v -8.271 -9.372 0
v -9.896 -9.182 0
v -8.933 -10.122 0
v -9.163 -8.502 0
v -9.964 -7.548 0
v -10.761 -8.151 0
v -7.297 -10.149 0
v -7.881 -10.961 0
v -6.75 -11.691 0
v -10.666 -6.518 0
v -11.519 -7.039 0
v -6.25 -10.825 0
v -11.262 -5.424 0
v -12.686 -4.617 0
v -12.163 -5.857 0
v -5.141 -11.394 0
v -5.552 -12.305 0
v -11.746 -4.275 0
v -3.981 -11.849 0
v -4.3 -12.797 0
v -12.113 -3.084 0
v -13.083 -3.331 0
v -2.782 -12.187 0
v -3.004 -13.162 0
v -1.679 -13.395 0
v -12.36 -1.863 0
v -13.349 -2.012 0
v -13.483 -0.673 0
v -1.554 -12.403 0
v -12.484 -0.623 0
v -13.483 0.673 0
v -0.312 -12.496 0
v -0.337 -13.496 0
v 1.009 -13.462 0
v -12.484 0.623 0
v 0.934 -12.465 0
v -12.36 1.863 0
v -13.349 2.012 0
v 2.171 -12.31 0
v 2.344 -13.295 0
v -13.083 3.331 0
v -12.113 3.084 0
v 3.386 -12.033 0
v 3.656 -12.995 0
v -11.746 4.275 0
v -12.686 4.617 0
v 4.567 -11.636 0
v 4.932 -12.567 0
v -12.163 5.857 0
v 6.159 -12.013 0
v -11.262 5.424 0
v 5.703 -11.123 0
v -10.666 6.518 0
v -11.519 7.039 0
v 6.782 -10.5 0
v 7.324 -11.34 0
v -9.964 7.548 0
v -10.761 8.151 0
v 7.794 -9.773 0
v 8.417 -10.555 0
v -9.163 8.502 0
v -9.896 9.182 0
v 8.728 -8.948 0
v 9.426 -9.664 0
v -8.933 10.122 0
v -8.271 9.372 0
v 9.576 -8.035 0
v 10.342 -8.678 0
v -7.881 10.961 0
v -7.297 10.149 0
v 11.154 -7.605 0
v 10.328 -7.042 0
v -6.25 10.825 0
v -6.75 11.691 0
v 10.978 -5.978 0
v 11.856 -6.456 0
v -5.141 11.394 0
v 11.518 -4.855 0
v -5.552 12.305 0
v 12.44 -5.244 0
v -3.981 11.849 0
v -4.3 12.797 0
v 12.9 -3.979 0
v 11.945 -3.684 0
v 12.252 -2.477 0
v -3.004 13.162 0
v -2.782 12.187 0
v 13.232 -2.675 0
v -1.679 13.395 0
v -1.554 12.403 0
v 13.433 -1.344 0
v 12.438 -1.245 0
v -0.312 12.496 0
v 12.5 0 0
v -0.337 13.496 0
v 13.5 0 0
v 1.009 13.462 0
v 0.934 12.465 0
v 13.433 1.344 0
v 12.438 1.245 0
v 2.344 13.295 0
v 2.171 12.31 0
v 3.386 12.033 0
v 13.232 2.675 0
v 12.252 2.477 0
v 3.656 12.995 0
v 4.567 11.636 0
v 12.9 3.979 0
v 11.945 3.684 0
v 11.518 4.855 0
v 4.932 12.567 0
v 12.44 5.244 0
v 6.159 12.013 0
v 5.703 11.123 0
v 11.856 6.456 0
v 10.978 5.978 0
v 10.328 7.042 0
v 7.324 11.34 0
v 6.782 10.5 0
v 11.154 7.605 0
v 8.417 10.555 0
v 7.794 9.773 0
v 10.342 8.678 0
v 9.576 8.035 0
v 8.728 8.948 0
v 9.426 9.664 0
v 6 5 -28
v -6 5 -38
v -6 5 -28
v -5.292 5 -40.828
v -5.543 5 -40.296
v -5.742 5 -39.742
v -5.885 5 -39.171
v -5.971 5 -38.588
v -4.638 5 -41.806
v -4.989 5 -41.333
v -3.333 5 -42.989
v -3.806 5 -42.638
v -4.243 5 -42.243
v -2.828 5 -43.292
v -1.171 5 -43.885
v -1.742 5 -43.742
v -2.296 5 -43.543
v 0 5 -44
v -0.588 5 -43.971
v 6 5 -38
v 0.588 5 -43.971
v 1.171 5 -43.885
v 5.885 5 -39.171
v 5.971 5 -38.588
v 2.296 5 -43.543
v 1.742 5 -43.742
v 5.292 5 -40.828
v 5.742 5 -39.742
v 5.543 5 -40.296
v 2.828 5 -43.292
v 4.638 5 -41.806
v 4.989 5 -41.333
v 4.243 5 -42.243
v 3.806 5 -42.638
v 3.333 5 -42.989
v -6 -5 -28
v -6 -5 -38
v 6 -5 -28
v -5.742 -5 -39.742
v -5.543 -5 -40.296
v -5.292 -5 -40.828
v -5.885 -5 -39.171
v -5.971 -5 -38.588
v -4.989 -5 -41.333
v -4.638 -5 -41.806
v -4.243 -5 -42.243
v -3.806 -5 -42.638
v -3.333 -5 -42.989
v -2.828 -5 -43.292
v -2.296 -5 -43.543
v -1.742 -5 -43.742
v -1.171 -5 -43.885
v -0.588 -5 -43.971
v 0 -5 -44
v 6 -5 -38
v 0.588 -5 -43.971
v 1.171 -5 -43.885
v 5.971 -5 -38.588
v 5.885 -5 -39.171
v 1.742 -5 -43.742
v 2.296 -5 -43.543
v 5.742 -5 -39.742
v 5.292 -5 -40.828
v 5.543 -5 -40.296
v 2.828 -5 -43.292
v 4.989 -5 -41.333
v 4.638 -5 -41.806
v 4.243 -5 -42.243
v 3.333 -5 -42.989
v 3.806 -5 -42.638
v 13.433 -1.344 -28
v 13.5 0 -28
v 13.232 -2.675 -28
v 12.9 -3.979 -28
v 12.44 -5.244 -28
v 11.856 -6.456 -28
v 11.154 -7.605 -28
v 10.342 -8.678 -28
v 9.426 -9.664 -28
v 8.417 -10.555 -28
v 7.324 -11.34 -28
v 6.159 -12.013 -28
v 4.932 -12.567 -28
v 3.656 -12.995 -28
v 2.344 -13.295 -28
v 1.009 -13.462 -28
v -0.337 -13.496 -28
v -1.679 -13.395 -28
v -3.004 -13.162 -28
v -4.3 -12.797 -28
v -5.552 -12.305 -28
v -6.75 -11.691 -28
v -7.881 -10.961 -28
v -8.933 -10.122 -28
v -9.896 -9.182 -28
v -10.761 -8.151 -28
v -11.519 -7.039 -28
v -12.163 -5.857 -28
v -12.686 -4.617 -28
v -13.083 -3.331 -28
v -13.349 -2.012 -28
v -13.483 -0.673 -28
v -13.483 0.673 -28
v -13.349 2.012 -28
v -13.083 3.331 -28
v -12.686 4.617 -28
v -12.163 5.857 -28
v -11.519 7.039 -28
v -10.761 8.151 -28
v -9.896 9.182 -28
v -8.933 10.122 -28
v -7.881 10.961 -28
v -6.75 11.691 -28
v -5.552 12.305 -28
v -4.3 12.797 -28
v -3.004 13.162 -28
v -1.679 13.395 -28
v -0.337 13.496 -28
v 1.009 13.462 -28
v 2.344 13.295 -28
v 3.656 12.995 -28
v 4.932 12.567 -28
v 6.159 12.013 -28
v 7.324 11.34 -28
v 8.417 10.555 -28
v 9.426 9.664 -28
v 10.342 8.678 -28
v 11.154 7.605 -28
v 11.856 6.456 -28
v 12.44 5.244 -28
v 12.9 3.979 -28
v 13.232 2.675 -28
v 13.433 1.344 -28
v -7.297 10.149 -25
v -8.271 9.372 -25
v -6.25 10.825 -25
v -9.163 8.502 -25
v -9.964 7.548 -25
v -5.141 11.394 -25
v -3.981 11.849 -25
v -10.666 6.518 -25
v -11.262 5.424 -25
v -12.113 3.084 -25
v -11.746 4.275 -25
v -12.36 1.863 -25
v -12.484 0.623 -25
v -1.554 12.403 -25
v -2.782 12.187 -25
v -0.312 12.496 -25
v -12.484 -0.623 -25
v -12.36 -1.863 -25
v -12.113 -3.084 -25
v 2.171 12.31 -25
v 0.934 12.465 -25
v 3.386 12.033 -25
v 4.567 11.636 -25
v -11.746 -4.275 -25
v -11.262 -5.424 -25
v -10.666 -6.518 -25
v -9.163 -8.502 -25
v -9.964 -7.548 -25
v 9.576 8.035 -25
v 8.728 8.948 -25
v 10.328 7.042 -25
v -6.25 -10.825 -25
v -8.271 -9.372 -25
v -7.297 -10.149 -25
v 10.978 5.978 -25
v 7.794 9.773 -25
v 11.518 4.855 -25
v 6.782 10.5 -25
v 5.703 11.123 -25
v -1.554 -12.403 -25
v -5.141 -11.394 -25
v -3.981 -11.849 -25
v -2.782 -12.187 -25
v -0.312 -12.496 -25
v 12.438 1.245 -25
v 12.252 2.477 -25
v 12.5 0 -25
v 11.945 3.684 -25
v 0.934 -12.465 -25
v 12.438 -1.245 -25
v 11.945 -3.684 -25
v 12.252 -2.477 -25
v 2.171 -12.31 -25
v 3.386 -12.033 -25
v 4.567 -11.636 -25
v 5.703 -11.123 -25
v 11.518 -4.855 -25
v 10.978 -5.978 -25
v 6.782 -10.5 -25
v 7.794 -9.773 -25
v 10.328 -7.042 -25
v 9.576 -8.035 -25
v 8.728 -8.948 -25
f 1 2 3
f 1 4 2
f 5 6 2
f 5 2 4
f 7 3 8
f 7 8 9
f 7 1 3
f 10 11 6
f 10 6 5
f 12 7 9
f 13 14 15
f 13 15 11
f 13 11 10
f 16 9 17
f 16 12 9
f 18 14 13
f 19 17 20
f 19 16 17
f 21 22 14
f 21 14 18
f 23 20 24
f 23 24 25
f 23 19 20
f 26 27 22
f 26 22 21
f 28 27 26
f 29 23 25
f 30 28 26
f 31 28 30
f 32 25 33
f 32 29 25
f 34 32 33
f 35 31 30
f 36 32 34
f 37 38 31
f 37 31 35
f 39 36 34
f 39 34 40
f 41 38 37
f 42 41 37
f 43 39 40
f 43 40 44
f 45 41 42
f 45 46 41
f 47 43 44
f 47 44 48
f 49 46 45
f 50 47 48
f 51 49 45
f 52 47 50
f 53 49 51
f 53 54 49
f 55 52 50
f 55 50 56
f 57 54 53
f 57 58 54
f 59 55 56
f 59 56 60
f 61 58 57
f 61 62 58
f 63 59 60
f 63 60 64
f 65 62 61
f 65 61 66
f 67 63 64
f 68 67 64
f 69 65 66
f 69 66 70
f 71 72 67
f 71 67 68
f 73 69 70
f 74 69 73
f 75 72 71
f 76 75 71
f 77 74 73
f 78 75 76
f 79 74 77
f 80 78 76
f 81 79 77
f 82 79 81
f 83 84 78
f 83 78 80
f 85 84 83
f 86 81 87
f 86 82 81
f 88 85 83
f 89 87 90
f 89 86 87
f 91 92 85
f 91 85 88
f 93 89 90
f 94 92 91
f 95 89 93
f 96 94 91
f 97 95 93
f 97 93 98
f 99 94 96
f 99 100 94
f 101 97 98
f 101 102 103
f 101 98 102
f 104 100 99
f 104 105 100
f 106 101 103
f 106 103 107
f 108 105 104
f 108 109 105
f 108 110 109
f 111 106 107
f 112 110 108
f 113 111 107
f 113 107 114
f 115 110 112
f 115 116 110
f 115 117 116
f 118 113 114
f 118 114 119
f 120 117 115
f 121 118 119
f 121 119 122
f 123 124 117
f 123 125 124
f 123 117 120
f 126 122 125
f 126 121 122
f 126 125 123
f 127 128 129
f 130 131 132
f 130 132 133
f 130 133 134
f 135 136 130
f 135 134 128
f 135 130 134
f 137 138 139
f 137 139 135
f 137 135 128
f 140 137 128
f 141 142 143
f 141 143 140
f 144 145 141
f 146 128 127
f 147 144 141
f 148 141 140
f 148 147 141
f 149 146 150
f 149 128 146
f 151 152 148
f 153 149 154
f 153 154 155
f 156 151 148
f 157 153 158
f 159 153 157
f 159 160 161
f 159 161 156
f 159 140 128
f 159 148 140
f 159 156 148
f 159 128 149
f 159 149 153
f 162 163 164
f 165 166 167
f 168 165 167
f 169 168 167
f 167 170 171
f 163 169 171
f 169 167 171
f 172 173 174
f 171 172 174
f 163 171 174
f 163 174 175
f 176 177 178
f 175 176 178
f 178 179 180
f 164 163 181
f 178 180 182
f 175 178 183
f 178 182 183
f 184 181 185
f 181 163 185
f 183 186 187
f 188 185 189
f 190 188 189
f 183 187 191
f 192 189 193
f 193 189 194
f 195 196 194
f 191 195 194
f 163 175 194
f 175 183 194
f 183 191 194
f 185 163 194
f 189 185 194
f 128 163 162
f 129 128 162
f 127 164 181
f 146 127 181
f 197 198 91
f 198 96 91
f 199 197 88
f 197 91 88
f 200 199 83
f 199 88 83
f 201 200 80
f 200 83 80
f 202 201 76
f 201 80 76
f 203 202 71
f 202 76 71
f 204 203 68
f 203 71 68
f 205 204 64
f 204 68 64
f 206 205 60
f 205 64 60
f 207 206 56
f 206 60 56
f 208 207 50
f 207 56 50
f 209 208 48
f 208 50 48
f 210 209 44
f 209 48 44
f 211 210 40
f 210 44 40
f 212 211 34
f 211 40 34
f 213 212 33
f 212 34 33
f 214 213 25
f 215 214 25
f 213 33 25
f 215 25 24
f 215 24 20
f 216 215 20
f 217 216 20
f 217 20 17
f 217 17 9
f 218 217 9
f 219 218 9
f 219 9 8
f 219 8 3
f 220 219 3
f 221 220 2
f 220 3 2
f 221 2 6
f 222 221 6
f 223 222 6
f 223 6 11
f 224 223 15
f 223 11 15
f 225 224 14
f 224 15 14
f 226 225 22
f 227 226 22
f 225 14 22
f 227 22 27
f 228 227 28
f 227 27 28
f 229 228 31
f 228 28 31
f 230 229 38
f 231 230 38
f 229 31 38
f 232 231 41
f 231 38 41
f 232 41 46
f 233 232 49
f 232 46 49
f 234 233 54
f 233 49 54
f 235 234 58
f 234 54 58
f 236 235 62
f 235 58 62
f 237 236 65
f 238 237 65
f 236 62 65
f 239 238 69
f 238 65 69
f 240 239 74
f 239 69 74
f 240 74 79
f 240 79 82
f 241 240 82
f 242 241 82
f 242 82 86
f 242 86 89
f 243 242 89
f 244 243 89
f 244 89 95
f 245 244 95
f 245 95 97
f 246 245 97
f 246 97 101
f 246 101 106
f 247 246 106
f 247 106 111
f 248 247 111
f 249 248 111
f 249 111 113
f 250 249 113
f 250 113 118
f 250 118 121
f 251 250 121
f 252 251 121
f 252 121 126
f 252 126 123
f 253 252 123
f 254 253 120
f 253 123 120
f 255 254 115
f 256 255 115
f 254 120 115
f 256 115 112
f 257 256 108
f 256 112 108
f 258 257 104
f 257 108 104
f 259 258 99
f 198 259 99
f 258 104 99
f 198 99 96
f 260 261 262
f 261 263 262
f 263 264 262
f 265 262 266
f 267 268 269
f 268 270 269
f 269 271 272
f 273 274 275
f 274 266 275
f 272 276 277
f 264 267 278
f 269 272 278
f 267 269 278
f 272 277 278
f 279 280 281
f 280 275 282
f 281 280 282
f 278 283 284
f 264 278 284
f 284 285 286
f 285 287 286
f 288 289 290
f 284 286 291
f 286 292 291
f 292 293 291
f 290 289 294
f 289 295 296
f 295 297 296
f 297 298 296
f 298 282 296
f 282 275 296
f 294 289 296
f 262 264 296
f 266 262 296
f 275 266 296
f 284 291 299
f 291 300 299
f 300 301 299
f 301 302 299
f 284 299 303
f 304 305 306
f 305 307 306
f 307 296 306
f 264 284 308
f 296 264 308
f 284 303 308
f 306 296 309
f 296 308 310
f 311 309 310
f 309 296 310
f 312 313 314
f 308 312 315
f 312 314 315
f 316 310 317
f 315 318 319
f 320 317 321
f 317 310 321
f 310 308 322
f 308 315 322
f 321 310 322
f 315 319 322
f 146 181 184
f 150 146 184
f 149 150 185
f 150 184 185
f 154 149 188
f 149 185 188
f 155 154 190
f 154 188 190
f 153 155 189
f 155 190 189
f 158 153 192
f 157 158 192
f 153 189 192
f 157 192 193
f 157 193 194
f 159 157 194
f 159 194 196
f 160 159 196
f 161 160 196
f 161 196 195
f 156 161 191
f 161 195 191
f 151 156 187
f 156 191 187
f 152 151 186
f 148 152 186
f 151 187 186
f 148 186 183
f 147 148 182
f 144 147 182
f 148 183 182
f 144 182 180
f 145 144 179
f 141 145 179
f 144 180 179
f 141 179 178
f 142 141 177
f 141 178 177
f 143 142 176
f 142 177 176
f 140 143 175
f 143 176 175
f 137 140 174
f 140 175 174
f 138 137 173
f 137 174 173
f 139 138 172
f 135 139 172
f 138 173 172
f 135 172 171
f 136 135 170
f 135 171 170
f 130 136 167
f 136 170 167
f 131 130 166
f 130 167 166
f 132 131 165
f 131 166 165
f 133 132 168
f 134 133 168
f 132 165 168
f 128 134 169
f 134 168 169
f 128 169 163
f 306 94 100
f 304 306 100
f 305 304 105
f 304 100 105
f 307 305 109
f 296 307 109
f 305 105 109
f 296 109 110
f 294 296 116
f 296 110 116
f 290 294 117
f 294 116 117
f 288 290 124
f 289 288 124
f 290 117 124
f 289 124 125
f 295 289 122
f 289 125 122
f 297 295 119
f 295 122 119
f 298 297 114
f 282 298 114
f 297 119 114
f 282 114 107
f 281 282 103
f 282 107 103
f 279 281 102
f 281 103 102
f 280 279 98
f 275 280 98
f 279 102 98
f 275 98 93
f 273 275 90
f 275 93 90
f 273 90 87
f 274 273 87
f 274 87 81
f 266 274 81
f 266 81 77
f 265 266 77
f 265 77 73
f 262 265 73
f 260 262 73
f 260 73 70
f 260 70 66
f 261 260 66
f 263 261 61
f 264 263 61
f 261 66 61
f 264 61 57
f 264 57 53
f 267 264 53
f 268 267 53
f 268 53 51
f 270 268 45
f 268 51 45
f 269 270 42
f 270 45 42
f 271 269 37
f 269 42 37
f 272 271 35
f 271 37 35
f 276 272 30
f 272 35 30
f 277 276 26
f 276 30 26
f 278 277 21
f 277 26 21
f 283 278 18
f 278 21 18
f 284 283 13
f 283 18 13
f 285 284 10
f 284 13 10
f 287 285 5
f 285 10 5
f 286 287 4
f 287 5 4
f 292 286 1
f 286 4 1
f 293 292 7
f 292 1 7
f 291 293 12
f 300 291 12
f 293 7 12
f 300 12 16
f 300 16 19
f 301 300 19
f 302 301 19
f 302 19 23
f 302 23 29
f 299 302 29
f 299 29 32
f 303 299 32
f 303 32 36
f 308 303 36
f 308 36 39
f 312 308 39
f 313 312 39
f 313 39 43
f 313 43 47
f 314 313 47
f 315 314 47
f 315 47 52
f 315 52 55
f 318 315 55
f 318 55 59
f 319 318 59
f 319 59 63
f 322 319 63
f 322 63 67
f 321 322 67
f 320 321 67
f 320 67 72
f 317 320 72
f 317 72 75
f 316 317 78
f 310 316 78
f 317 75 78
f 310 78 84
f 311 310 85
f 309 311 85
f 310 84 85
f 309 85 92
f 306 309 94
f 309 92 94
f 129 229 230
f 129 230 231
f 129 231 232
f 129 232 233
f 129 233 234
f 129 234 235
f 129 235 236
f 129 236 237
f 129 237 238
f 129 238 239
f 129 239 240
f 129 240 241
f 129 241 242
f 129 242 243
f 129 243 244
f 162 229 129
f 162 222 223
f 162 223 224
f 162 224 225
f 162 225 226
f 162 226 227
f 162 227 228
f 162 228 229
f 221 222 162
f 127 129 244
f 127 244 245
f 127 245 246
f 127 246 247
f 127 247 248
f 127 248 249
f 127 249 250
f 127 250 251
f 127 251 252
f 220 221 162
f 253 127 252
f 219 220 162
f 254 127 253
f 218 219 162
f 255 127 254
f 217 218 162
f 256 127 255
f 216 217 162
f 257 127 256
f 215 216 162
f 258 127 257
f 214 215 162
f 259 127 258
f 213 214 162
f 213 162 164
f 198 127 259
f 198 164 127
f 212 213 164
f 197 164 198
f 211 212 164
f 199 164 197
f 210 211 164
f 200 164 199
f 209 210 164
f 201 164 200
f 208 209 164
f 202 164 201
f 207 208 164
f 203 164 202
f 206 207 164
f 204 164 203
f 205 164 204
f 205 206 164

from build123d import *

# Parameters (mm, degrees)
SKETCH_1_R           = 13.5
SKETCH_1_R_2         = 12.5
EXTRUDE_1_DEPTH      = 25
SKETCH_2_R           = 13.5
EXTRUDE_2_DEPTH      = 3
EXTRUDE_3_DEPTH      = 5
EXTRUDE_3_DEPTH_BACK = 5


with BuildPart() as part:
    # 草图1 → 凸台-拉伸1 (new body)
    with BuildSketch(Plane.XY):
        Circle(SKETCH_1_R)
        Circle(SKETCH_1_R_2, mode=Mode.SUBTRACT)
    extrude(amount=-EXTRUDE_1_DEPTH)

    # 草图2 → 凸台-拉伸2 (add)
    with BuildSketch(Plane(origin=(0, 0, -25), x_dir=(-1, 0, 0), z_dir=(0, 0, -1))):
        Circle(SKETCH_2_R)
    extrude(amount=EXTRUDE_2_DEPTH)

    # 草图3 → 凸台-拉伸3 (add, two sides: drawn at the far end of the back side and taken through both)
    with BuildSketch(Plane(origin=(0, 0, 0), x_dir=(1, 0, 0), z_dir=(0, 1, 0)).offset(-EXTRUDE_3_DEPTH_BACK)):
        with BuildLine():
            Line((-6, 28), (6, 28))
            Line((6, 28), (6, 38))
            ThreePointArc((6, 38), (0, 44), (-6, 38))
            Line((-6, 38), (-6, 28))
        make_face()
    extrude(amount=EXTRUDE_3_DEPTH + EXTRUDE_3_DEPTH_BACK)


solid = part.part
